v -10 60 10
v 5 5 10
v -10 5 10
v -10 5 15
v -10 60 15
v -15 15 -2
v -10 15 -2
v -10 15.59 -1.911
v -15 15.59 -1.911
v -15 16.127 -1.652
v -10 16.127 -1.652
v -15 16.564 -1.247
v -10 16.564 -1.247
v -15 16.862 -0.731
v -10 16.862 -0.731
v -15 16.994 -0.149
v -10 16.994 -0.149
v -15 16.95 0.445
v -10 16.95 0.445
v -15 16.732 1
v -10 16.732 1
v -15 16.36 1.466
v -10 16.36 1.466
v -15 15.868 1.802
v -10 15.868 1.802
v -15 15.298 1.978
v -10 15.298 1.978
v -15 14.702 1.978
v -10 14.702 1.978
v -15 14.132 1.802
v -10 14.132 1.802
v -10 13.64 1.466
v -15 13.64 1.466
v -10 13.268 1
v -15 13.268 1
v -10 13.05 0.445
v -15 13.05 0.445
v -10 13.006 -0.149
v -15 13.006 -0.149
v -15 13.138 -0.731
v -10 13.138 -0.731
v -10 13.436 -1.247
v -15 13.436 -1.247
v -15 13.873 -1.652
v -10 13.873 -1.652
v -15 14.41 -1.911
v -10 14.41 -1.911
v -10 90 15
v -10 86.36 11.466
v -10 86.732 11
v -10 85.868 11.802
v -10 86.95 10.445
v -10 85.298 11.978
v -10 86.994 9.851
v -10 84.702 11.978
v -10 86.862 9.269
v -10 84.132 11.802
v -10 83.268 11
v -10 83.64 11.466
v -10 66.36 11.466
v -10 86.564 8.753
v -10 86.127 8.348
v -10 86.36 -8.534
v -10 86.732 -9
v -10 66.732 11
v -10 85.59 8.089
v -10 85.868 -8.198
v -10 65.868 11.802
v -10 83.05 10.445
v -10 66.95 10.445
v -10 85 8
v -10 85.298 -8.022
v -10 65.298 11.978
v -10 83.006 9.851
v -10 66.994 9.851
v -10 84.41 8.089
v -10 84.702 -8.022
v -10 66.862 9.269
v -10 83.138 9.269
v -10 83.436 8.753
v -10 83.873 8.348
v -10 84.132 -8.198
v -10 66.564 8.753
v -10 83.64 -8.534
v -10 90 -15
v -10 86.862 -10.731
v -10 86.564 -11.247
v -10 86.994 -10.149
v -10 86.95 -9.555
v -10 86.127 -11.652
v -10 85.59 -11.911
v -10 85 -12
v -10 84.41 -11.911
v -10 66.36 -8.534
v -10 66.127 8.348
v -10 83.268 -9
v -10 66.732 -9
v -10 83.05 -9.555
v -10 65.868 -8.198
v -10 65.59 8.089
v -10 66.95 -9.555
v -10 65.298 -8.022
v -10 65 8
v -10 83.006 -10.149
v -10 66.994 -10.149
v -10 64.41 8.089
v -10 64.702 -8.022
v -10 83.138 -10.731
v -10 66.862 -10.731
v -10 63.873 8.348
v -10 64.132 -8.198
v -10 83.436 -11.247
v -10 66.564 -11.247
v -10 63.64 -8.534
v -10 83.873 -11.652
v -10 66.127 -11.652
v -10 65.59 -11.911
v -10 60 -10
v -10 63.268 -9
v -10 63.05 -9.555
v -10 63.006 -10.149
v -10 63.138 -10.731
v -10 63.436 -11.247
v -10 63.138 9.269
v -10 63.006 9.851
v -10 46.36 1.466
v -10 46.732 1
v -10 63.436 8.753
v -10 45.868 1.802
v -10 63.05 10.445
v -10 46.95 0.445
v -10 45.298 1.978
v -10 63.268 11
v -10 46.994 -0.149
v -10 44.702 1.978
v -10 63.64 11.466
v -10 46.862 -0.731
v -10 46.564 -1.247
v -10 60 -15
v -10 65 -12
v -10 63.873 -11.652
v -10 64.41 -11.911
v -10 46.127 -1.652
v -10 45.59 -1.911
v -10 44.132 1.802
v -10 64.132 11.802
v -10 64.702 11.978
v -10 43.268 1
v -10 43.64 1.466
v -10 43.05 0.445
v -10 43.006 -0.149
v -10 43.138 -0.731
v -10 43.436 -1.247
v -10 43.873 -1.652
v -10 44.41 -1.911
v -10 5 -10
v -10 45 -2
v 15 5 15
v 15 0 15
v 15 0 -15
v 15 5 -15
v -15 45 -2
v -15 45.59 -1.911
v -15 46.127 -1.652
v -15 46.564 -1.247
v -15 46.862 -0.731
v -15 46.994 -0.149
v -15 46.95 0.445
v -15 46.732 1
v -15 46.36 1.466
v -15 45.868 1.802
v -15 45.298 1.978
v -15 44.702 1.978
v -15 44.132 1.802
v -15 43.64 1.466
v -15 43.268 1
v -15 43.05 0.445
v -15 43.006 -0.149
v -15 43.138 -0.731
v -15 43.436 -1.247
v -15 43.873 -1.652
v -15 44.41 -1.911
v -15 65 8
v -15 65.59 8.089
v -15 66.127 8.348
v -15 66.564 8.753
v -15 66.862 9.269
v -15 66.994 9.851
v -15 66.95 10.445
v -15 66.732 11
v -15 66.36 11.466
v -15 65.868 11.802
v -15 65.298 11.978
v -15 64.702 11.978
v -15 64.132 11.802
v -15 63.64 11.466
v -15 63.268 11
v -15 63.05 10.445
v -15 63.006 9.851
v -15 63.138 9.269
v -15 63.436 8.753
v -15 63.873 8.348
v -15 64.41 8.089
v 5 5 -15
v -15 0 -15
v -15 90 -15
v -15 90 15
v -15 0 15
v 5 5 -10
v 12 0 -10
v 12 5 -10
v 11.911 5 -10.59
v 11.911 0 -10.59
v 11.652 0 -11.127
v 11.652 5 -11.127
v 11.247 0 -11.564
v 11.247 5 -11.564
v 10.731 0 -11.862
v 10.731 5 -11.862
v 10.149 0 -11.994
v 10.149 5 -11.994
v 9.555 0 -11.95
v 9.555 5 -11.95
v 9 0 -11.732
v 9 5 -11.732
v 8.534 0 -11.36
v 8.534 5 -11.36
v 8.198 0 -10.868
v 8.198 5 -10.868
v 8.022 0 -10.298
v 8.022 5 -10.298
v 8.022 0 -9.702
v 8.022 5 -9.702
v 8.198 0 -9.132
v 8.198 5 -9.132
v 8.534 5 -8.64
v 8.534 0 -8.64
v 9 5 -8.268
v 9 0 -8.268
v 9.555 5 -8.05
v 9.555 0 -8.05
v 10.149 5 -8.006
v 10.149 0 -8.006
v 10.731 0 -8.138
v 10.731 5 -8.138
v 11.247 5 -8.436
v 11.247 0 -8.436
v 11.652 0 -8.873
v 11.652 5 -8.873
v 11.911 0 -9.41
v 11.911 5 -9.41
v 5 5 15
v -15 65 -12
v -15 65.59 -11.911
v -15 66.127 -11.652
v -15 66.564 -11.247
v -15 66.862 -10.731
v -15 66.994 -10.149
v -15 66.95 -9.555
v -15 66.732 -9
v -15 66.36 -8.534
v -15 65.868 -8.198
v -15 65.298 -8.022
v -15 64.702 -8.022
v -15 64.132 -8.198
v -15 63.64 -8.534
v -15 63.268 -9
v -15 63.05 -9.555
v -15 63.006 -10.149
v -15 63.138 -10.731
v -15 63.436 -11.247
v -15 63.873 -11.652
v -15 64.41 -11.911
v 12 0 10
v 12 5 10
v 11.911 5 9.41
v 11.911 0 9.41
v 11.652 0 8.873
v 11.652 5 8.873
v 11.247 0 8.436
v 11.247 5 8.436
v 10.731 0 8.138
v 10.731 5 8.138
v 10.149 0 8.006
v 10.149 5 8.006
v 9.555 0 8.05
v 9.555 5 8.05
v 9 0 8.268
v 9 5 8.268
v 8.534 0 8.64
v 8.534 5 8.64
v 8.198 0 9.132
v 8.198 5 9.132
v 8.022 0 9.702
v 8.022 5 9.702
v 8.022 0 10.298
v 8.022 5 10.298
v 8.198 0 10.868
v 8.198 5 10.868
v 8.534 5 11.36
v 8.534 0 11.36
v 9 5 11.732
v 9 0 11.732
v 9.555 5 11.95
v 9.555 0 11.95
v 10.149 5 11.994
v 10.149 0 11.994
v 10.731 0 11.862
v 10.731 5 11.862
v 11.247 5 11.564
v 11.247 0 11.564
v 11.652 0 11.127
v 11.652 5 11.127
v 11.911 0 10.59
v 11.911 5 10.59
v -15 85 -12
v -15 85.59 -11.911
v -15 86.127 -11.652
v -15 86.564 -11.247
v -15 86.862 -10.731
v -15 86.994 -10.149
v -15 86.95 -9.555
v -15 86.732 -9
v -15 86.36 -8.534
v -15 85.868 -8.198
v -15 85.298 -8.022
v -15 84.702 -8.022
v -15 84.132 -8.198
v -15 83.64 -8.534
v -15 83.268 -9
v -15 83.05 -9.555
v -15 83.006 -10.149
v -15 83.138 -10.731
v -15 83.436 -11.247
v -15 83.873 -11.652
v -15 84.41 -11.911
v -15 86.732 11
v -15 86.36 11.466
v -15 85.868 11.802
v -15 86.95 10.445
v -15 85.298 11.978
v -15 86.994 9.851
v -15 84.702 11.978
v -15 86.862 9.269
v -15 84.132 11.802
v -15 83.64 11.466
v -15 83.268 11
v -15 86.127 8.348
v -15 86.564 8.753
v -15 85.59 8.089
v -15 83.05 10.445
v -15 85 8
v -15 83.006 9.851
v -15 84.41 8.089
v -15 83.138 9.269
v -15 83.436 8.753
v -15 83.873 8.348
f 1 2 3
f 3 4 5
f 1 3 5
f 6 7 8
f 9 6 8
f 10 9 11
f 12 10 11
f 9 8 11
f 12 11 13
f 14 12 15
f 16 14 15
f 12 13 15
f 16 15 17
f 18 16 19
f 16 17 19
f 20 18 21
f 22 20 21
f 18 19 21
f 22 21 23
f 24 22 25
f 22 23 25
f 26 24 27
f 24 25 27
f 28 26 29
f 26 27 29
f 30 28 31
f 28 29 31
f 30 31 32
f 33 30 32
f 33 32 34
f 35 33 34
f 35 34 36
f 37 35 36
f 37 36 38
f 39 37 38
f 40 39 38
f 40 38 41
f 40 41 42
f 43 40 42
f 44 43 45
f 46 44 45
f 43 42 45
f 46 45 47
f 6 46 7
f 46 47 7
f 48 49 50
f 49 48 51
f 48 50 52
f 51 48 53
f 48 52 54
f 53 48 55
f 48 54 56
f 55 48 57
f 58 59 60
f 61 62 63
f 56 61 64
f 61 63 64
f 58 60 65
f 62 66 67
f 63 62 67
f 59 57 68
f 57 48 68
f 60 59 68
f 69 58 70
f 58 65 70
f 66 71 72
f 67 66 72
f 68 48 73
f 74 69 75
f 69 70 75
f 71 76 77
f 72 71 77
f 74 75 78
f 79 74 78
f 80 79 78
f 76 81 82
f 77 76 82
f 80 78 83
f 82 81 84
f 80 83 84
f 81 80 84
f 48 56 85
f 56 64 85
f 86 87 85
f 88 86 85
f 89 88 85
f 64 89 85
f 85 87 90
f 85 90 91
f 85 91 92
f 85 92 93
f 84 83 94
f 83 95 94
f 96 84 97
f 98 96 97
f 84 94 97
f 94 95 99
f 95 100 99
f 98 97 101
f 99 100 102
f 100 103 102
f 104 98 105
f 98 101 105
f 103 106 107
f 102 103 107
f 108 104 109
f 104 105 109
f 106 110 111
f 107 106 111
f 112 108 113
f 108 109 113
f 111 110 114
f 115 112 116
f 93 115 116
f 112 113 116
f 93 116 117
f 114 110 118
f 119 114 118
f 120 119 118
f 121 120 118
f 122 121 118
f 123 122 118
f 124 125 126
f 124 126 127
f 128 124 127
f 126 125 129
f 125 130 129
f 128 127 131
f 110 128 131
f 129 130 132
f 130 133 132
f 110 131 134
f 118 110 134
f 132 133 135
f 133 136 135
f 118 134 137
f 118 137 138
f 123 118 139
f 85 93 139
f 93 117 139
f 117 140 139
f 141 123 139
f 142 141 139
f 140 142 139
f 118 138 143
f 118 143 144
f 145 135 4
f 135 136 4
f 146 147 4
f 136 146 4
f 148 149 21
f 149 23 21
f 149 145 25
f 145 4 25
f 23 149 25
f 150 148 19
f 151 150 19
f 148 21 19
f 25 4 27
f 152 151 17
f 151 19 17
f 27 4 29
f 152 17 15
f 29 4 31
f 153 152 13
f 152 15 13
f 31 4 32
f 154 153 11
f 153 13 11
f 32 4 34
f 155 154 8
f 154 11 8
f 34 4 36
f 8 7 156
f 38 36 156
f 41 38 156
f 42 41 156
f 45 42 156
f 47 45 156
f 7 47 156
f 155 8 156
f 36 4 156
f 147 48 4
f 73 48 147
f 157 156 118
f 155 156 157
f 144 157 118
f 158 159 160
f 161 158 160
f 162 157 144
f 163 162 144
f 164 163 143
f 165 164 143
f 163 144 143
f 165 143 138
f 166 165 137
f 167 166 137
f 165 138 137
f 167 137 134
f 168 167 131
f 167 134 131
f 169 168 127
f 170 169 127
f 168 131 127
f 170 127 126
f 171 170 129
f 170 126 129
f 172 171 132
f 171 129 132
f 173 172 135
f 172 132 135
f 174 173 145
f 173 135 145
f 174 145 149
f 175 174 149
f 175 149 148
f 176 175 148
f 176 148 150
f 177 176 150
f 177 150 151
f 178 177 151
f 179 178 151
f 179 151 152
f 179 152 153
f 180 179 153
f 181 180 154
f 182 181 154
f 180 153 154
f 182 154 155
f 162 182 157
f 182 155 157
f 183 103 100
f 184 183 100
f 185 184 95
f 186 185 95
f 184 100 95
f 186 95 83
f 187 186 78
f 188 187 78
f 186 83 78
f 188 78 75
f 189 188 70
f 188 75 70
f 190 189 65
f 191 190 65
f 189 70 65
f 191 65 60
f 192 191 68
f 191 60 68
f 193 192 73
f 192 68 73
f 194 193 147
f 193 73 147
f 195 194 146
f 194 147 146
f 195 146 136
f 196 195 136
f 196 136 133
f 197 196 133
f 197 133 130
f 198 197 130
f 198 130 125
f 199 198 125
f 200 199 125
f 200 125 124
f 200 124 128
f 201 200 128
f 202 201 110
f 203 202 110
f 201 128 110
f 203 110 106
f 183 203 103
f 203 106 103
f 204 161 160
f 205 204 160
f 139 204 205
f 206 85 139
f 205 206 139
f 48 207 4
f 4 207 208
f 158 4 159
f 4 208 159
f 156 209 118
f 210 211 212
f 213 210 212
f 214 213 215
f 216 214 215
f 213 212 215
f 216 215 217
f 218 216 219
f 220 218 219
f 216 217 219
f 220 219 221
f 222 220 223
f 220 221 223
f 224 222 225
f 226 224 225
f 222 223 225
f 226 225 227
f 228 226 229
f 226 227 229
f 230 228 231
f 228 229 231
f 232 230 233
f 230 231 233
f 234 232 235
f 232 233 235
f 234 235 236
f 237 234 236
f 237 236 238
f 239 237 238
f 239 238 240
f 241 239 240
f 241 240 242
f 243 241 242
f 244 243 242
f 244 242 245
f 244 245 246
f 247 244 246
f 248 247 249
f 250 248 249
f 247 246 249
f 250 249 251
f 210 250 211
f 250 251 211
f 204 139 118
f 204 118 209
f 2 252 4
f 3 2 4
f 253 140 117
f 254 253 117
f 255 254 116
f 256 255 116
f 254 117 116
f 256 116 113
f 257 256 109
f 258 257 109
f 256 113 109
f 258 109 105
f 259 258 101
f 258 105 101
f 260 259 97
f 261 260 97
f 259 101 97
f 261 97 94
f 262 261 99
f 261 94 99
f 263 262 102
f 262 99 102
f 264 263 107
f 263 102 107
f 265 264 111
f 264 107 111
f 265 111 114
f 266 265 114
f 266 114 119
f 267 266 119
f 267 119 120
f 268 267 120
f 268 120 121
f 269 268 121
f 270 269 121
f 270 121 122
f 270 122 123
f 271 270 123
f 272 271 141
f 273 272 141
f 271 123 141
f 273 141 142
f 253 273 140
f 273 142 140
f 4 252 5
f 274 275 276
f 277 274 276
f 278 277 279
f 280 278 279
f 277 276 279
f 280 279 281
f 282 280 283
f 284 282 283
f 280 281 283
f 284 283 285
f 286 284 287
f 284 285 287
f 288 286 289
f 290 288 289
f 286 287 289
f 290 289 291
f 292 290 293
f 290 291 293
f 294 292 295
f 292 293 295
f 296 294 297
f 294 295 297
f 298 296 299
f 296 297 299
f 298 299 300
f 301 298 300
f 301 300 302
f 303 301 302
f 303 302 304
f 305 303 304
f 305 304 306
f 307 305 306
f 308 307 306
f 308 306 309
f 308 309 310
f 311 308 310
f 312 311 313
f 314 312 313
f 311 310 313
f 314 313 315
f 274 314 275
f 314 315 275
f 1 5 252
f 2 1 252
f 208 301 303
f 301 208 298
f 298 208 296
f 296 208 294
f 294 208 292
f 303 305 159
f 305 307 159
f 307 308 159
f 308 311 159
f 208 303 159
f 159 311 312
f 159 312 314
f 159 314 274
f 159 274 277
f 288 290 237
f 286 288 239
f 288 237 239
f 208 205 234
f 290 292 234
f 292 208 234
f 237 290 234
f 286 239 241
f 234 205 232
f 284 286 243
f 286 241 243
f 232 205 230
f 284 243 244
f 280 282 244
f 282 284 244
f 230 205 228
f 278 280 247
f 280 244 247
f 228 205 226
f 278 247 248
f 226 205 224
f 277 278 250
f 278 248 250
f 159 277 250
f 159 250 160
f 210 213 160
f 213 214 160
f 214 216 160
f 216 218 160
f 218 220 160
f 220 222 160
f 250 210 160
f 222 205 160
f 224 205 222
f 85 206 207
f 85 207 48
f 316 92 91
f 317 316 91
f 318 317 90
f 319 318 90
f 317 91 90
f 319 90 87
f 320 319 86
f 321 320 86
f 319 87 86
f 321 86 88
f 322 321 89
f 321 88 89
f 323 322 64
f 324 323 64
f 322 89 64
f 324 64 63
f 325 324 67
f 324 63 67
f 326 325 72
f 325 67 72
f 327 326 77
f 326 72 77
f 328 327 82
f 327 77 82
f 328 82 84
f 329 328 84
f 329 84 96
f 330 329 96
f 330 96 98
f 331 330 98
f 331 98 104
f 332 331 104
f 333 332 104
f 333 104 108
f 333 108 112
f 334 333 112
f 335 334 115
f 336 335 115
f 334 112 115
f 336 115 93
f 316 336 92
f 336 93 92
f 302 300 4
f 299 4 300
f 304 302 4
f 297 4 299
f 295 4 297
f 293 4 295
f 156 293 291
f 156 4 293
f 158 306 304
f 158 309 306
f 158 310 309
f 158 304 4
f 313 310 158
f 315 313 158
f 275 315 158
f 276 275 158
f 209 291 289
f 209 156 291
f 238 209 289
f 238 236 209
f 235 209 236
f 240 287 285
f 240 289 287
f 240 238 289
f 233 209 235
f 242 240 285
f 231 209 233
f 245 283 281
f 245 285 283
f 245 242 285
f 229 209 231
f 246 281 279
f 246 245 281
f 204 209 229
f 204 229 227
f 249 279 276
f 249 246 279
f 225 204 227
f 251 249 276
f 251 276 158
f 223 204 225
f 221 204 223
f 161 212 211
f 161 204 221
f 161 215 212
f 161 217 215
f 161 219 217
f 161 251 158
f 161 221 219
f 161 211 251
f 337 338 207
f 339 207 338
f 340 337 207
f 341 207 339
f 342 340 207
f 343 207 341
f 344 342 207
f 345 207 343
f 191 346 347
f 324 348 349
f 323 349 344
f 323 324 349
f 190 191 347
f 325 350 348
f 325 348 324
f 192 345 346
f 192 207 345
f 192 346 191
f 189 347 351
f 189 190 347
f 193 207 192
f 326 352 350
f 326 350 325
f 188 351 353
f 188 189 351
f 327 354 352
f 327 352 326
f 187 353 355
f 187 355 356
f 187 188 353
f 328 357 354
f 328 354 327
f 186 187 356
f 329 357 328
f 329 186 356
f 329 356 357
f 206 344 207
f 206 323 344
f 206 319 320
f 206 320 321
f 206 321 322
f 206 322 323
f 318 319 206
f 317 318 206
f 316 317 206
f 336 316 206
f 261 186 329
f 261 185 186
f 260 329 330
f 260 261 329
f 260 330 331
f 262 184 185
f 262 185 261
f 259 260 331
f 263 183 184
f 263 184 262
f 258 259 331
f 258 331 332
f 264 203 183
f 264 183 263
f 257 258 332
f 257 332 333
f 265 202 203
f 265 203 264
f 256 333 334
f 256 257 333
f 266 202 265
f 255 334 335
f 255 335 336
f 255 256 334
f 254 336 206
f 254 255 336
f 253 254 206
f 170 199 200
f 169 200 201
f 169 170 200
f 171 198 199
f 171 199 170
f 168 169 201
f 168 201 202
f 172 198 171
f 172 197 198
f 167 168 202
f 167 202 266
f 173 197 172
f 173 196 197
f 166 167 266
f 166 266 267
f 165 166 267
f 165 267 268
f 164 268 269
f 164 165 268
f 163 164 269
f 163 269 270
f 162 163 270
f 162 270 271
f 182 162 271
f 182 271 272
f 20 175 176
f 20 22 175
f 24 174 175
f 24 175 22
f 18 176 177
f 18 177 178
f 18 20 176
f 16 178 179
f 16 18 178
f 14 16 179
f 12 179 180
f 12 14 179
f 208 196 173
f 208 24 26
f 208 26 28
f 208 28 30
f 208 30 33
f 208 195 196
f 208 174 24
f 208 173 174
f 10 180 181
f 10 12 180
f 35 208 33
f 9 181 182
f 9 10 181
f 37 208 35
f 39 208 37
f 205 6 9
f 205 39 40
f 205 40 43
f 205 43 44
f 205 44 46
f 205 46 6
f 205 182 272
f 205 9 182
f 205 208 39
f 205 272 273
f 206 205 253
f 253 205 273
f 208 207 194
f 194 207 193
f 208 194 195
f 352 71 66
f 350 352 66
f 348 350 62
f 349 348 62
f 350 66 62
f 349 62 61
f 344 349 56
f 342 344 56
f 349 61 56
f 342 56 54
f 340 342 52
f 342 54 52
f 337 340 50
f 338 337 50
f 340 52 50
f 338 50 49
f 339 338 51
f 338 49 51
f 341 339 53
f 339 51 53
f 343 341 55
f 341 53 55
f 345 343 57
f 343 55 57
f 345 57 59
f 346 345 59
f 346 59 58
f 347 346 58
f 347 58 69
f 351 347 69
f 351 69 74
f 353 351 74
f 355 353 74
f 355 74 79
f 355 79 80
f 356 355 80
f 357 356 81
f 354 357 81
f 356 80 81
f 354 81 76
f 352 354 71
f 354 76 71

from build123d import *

# Parameters (mm, degrees)
SKETCH1_W           = 30
SKETCH1_H           = 30
BOSS_EXTRUDE1_DEPTH = 5
SKETCH2_W           = 5
SKETCH2_H           = 30
BOSS_EXTRUDE2_DEPTH = 85
BOSS_EXTRUDE3_DEPTH = 5
BOSS_EXTRUDE4_DEPTH = 5
SKETCH10_R          = 2
CUT_EXTRUDE1_DEPTH  = 5
SKETCH11_R          = 2
CUT_EXTRUDE2_DEPTH  = 5
SKETCH12_R          = 2
CUT_EXTRUDE3_DEPTH  = 5


with BuildPart() as part:
    # Sketch1 → Boss-Extrude1 (new body)
    with BuildSketch(Plane(origin=(0, 0, 0), x_dir=(1, 0, 0), z_dir=(0, 1, 0))):
        Rectangle(SKETCH1_W, SKETCH1_H)
    extrude(amount=BOSS_EXTRUDE1_DEPTH)

    # Sketch2 → Boss-Extrude2 (add)
    with BuildSketch(Plane(origin=(0, 5, 0), x_dir=(1, 0, 0), z_dir=(0, 1, 0))):
        with Locations((-12.5, 0)):
            Rectangle(SKETCH2_W, SKETCH2_H)
    extrude(amount=BOSS_EXTRUDE2_DEPTH)

    # Sketch5 → Boss-Extrude4 (add)
    with BuildSketch(Plane.XY.offset(-15)):
        Polygon((-10, 5), (-10, 60), (5, 5), align=None)
    extrude(amount=BOSS_EXTRUDE4_DEPTH)

    # Sketch10 → Cut-Extrude1 (cut)
    with BuildSketch(Plane(origin=(-10, 0, 0), x_dir=(0, 0, -1), z_dir=(1, 0, 0))):
        with Locations((-10, 85)):
            Circle(SKETCH10_R)
        with Locations((10, 85)):
            Circle(SKETCH10_R)
        with Locations((0, 15)):
            Circle(SKETCH10_R)
        with Locations((0, 45)):
            Circle(SKETCH10_R)
    extrude(amount=-CUT_EXTRUDE1_DEPTH, mode=Mode.SUBTRACT)

    # Sketch11 → Cut-Extrude2 (cut)
    with BuildSketch(Plane(origin=(0, 5, 0), x_dir=(1, 0, 0), z_dir=(0, 1, 0))):
        with Locations((10, 10)):
            Circle(SKETCH11_R)
        with Locations((10, -10)):
            Circle(SKETCH11_R)
    extrude(amount=-CUT_EXTRUDE2_DEPTH, mode=Mode.SUBTRACT)

    # Sketch12 → Cut-Extrude3 (cut)
    with BuildSketch(Plane(origin=(-10, 0, 0), x_dir=(0, 0, -1), z_dir=(1, 0, 0))):
        with Locations((-10, 65)):
            Circle(SKETCH12_R)
        with Locations((10, 65)):
            Circle(SKETCH12_R)
    extrude(amount=-CUT_EXTRUDE3_DEPTH, mode=Mode.SUBTRACT)


with BuildPart() as body_2:
    # Sketch3 → Boss-Extrude3 (new body)
    with BuildSketch(Plane.XY.offset(15)):
        Polygon((-10, 5), (-10, 60), (5, 5), align=None)
    extrude(amount=-BOSS_EXTRUDE3_DEPTH)


solid = Compound([part.part, body_2.part])
